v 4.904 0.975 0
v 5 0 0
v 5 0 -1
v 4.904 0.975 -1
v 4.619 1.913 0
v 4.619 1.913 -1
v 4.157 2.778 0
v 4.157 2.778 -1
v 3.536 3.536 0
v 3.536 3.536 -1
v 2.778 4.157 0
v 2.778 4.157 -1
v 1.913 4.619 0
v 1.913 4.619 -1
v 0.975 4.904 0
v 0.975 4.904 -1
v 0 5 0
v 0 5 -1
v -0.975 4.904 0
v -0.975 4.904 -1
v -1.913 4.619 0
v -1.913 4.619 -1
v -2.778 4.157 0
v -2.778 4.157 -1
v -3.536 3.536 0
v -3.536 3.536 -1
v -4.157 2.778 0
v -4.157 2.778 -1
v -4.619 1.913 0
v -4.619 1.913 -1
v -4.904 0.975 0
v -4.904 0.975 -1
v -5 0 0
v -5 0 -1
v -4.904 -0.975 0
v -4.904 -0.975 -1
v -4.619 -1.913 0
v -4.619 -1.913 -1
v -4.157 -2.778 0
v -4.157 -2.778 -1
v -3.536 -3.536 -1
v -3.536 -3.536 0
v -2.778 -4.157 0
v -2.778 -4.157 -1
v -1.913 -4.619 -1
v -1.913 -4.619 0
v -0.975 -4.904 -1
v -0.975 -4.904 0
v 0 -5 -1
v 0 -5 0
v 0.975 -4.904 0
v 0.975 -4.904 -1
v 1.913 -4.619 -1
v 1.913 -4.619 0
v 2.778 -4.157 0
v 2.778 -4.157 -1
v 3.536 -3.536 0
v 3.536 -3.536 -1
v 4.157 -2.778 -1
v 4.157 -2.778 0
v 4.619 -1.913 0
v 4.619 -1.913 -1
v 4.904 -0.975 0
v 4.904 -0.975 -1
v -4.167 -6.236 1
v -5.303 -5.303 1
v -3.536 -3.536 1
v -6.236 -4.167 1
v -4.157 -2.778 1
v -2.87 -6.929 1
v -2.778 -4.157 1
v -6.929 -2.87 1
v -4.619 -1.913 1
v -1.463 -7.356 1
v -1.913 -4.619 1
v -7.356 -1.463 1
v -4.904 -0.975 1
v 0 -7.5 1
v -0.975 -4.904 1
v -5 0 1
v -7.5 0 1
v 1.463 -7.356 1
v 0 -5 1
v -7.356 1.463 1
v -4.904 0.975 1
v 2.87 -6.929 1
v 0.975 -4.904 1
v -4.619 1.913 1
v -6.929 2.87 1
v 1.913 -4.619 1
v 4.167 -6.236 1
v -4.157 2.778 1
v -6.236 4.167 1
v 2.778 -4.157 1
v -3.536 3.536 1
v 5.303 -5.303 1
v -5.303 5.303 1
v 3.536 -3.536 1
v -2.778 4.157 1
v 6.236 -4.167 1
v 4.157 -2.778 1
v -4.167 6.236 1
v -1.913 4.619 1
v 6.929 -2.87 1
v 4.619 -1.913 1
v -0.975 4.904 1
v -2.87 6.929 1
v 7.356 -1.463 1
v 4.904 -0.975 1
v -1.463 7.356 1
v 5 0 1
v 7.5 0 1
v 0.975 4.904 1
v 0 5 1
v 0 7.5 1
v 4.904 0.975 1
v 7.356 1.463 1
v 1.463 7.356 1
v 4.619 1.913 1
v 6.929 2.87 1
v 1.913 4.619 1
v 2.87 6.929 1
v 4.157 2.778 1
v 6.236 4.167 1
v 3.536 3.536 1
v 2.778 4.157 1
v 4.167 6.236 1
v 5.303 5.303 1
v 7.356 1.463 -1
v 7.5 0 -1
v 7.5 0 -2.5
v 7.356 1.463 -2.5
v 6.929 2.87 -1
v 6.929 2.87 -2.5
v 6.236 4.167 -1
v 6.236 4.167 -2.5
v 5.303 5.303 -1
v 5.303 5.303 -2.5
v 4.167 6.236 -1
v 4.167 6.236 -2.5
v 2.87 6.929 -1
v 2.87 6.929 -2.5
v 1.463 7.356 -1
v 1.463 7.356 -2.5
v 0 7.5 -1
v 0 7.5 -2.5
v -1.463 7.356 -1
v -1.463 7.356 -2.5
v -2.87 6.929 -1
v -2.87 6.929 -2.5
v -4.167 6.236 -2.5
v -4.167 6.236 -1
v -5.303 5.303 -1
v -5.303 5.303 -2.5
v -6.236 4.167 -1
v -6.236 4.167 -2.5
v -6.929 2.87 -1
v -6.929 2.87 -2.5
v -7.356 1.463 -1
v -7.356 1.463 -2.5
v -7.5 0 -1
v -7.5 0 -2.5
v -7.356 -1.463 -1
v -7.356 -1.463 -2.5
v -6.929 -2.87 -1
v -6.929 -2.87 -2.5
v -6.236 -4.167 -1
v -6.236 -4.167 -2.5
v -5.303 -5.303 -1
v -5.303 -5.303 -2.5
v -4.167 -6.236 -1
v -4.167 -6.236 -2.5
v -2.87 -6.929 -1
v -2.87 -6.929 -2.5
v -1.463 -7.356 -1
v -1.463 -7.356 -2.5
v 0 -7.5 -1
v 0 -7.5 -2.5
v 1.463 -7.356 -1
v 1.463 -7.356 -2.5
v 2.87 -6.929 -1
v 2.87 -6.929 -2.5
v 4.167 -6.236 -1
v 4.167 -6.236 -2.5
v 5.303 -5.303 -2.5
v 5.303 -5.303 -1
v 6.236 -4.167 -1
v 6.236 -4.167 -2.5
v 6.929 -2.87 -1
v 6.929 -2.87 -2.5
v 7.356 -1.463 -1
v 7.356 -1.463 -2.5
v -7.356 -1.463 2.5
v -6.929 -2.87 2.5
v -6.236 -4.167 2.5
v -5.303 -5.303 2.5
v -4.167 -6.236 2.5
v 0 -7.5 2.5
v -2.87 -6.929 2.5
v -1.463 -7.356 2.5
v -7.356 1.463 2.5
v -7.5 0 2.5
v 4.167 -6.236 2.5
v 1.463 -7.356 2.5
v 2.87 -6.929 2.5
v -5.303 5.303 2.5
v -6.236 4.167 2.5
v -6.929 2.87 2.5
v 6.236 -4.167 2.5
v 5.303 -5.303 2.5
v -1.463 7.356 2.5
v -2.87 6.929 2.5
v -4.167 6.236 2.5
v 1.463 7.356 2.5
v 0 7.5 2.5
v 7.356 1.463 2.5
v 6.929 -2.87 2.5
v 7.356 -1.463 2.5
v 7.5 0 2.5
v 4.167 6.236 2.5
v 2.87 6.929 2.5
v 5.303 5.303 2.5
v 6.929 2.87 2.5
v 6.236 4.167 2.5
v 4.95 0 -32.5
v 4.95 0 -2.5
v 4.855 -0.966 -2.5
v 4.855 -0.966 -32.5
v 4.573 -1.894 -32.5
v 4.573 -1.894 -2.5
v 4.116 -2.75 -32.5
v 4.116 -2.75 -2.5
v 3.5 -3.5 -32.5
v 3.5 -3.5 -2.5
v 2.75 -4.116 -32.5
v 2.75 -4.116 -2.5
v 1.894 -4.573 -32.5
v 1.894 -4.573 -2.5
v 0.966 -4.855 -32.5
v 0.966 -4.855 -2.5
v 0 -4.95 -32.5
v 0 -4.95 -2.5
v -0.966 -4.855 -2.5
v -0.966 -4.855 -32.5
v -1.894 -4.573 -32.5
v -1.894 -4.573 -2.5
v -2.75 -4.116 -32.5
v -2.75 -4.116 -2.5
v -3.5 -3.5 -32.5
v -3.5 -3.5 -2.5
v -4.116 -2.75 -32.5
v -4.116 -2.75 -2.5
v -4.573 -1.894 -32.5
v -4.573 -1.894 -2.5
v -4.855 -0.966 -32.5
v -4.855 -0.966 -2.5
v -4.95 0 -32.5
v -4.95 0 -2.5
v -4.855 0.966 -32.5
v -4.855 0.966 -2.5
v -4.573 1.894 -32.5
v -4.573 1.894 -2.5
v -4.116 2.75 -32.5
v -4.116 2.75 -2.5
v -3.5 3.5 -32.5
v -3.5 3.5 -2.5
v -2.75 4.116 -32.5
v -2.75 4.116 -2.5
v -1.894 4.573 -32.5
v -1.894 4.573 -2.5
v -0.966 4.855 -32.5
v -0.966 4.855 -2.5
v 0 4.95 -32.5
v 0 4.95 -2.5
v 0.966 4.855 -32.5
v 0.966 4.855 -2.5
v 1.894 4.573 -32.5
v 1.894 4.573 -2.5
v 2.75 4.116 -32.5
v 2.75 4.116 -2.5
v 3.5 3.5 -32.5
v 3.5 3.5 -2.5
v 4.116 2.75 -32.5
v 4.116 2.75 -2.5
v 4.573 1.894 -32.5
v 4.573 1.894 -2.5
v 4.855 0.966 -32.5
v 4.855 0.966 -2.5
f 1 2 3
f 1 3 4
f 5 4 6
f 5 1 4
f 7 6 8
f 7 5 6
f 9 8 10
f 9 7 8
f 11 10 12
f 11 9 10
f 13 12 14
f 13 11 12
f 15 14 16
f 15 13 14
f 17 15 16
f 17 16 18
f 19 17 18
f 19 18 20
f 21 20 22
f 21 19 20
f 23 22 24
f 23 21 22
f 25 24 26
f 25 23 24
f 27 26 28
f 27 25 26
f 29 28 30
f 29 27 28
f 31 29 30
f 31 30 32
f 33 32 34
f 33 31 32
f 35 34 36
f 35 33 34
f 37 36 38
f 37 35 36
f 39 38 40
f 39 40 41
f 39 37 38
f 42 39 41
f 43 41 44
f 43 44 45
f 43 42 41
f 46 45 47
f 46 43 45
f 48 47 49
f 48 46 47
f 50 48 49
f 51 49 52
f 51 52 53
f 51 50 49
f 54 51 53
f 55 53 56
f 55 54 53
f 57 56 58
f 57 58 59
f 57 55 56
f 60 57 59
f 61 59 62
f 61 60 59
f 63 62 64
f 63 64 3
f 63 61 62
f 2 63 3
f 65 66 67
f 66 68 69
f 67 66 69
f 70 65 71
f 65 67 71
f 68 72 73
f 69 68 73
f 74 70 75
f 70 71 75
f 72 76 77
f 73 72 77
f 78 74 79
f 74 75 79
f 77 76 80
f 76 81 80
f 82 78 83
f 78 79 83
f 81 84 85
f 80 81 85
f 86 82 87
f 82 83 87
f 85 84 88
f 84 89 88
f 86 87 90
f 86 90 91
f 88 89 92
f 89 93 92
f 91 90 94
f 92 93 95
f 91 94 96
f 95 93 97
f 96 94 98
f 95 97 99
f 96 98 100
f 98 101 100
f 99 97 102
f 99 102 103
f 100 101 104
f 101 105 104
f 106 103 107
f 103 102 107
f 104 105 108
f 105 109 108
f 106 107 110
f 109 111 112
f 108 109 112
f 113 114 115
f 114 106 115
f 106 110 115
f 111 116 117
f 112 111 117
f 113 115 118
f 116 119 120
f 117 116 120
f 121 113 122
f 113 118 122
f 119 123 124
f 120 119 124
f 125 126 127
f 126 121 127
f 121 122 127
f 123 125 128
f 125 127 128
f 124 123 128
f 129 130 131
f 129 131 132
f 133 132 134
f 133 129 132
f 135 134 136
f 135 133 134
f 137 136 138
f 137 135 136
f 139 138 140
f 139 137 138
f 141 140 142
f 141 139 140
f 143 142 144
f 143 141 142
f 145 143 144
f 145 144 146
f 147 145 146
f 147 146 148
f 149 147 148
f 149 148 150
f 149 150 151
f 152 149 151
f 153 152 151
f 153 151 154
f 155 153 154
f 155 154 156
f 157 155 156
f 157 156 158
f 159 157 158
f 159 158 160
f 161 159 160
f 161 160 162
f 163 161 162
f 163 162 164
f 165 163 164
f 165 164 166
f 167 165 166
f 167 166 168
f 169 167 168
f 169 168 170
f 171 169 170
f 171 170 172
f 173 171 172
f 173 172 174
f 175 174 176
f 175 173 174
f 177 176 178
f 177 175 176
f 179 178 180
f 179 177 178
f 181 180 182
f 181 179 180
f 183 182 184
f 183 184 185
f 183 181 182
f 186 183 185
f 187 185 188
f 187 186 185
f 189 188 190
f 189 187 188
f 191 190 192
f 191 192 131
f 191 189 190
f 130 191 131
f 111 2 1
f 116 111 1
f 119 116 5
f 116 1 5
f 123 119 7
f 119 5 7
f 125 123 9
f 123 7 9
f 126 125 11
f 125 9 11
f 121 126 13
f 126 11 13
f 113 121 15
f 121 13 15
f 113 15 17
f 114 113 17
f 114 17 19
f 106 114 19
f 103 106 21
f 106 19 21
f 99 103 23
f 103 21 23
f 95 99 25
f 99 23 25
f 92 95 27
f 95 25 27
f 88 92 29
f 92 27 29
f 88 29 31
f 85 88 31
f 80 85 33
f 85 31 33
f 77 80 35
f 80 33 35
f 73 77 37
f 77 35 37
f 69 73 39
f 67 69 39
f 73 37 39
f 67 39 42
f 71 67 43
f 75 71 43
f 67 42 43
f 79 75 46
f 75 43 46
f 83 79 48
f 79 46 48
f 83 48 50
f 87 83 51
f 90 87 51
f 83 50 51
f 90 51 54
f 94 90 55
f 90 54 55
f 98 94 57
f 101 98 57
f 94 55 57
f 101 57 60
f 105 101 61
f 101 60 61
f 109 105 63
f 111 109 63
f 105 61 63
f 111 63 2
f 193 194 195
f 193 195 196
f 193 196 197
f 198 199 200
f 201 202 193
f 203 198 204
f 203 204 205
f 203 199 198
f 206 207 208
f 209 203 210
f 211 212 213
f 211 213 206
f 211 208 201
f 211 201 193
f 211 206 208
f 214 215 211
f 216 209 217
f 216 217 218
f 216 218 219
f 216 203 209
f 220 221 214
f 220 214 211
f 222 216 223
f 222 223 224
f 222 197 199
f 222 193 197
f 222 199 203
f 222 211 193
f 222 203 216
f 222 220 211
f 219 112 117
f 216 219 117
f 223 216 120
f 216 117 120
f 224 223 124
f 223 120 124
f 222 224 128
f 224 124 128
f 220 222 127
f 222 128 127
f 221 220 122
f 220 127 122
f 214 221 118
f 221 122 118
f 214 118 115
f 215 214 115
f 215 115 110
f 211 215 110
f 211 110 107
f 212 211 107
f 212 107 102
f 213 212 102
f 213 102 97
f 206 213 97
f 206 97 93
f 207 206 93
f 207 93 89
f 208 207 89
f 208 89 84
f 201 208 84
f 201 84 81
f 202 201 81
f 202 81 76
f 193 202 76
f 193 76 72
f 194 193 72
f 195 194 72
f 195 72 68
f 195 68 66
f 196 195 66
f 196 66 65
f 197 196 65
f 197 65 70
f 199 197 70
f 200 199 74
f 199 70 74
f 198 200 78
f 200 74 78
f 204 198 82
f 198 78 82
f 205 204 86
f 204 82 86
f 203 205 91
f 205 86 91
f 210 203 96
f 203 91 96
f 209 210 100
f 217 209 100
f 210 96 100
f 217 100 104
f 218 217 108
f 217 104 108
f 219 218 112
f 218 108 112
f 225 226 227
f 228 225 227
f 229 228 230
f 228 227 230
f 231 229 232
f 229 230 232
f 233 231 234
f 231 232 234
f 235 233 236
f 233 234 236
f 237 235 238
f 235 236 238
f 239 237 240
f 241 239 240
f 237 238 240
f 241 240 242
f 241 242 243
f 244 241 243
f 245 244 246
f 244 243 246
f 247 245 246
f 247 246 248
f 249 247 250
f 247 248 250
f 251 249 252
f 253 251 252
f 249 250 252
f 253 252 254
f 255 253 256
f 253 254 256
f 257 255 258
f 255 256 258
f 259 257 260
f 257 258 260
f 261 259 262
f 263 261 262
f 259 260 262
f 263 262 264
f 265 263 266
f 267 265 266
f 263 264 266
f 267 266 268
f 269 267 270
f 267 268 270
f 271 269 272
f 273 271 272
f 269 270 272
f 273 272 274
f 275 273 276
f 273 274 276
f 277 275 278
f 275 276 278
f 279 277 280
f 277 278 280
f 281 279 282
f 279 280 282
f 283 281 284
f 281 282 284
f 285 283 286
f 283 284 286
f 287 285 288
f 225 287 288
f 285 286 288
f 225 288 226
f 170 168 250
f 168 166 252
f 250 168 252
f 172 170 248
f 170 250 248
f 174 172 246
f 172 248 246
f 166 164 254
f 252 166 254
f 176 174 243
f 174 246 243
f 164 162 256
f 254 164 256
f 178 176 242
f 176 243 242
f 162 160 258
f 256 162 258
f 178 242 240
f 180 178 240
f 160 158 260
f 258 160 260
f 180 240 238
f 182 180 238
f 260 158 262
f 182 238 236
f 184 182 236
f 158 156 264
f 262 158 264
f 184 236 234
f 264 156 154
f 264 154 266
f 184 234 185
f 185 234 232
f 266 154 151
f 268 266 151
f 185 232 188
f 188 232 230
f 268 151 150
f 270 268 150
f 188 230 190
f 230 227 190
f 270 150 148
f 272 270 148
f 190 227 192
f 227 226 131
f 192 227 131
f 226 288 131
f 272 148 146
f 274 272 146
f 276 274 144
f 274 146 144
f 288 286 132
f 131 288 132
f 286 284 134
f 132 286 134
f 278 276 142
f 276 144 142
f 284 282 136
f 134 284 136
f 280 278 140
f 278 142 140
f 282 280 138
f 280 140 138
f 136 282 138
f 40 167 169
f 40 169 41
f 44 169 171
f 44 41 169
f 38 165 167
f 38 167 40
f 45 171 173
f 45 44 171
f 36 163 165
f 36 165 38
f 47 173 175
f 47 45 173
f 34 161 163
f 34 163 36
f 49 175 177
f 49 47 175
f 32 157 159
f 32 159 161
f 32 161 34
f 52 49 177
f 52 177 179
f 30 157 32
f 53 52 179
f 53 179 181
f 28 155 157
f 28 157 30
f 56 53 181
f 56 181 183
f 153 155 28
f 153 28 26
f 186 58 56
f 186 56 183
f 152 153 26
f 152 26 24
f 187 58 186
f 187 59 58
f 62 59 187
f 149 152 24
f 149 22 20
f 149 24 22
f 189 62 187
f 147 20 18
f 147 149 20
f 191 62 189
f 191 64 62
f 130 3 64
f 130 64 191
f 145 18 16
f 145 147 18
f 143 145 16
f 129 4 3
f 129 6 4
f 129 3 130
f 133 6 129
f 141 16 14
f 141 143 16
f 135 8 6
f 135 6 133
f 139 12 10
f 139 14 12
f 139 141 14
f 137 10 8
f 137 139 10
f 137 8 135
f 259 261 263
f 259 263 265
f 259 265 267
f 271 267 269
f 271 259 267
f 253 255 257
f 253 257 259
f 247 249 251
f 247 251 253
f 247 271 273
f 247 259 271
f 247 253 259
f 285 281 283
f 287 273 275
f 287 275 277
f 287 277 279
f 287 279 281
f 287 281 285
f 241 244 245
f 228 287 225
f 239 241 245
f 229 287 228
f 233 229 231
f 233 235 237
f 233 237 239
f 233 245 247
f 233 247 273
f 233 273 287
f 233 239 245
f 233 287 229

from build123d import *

# Parameters (mm, degrees)
F0_R          = 7.5
F1_DEPTH      = 2.5
F1_DEPTH_BACK = 2.5
F2_R          = 4.95
F3_DEPTH      = 30
F4_R          = 7.55
F4_R_2        = 5
F5_DEPTH      = 1
F5_DEPTH_BACK = 1


with BuildPart() as f1:
    # F0 (on Top) → F1 (new body, two sides)
    with BuildSketch(Plane.XY) as f1_sk:
        Circle(F0_R)
    extrude(amount=-F1_DEPTH)
    extrude(f1_sk.sketch, amount=F1_DEPTH_BACK)

    # F2 (on face) → F3 (join)
    with BuildSketch(Plane(origin=(0, 0, -2.5), x_dir=(1, 0, 0), z_dir=(0, 0, -1))):
        Circle(F2_R)
    extrude(amount=F3_DEPTH)

    # F4 (on Top) → F5 (cut, two sides)
    with BuildSketch(Plane.XY) as f5_sk:
        Circle(F4_R)
        Circle(F4_R_2, mode=Mode.SUBTRACT)
    extrude(amount=-F5_DEPTH, mode=Mode.SUBTRACT)
    extrude(f5_sk.sketch, amount=F5_DEPTH_BACK, mode=Mode.SUBTRACT)


solid = f1.part
